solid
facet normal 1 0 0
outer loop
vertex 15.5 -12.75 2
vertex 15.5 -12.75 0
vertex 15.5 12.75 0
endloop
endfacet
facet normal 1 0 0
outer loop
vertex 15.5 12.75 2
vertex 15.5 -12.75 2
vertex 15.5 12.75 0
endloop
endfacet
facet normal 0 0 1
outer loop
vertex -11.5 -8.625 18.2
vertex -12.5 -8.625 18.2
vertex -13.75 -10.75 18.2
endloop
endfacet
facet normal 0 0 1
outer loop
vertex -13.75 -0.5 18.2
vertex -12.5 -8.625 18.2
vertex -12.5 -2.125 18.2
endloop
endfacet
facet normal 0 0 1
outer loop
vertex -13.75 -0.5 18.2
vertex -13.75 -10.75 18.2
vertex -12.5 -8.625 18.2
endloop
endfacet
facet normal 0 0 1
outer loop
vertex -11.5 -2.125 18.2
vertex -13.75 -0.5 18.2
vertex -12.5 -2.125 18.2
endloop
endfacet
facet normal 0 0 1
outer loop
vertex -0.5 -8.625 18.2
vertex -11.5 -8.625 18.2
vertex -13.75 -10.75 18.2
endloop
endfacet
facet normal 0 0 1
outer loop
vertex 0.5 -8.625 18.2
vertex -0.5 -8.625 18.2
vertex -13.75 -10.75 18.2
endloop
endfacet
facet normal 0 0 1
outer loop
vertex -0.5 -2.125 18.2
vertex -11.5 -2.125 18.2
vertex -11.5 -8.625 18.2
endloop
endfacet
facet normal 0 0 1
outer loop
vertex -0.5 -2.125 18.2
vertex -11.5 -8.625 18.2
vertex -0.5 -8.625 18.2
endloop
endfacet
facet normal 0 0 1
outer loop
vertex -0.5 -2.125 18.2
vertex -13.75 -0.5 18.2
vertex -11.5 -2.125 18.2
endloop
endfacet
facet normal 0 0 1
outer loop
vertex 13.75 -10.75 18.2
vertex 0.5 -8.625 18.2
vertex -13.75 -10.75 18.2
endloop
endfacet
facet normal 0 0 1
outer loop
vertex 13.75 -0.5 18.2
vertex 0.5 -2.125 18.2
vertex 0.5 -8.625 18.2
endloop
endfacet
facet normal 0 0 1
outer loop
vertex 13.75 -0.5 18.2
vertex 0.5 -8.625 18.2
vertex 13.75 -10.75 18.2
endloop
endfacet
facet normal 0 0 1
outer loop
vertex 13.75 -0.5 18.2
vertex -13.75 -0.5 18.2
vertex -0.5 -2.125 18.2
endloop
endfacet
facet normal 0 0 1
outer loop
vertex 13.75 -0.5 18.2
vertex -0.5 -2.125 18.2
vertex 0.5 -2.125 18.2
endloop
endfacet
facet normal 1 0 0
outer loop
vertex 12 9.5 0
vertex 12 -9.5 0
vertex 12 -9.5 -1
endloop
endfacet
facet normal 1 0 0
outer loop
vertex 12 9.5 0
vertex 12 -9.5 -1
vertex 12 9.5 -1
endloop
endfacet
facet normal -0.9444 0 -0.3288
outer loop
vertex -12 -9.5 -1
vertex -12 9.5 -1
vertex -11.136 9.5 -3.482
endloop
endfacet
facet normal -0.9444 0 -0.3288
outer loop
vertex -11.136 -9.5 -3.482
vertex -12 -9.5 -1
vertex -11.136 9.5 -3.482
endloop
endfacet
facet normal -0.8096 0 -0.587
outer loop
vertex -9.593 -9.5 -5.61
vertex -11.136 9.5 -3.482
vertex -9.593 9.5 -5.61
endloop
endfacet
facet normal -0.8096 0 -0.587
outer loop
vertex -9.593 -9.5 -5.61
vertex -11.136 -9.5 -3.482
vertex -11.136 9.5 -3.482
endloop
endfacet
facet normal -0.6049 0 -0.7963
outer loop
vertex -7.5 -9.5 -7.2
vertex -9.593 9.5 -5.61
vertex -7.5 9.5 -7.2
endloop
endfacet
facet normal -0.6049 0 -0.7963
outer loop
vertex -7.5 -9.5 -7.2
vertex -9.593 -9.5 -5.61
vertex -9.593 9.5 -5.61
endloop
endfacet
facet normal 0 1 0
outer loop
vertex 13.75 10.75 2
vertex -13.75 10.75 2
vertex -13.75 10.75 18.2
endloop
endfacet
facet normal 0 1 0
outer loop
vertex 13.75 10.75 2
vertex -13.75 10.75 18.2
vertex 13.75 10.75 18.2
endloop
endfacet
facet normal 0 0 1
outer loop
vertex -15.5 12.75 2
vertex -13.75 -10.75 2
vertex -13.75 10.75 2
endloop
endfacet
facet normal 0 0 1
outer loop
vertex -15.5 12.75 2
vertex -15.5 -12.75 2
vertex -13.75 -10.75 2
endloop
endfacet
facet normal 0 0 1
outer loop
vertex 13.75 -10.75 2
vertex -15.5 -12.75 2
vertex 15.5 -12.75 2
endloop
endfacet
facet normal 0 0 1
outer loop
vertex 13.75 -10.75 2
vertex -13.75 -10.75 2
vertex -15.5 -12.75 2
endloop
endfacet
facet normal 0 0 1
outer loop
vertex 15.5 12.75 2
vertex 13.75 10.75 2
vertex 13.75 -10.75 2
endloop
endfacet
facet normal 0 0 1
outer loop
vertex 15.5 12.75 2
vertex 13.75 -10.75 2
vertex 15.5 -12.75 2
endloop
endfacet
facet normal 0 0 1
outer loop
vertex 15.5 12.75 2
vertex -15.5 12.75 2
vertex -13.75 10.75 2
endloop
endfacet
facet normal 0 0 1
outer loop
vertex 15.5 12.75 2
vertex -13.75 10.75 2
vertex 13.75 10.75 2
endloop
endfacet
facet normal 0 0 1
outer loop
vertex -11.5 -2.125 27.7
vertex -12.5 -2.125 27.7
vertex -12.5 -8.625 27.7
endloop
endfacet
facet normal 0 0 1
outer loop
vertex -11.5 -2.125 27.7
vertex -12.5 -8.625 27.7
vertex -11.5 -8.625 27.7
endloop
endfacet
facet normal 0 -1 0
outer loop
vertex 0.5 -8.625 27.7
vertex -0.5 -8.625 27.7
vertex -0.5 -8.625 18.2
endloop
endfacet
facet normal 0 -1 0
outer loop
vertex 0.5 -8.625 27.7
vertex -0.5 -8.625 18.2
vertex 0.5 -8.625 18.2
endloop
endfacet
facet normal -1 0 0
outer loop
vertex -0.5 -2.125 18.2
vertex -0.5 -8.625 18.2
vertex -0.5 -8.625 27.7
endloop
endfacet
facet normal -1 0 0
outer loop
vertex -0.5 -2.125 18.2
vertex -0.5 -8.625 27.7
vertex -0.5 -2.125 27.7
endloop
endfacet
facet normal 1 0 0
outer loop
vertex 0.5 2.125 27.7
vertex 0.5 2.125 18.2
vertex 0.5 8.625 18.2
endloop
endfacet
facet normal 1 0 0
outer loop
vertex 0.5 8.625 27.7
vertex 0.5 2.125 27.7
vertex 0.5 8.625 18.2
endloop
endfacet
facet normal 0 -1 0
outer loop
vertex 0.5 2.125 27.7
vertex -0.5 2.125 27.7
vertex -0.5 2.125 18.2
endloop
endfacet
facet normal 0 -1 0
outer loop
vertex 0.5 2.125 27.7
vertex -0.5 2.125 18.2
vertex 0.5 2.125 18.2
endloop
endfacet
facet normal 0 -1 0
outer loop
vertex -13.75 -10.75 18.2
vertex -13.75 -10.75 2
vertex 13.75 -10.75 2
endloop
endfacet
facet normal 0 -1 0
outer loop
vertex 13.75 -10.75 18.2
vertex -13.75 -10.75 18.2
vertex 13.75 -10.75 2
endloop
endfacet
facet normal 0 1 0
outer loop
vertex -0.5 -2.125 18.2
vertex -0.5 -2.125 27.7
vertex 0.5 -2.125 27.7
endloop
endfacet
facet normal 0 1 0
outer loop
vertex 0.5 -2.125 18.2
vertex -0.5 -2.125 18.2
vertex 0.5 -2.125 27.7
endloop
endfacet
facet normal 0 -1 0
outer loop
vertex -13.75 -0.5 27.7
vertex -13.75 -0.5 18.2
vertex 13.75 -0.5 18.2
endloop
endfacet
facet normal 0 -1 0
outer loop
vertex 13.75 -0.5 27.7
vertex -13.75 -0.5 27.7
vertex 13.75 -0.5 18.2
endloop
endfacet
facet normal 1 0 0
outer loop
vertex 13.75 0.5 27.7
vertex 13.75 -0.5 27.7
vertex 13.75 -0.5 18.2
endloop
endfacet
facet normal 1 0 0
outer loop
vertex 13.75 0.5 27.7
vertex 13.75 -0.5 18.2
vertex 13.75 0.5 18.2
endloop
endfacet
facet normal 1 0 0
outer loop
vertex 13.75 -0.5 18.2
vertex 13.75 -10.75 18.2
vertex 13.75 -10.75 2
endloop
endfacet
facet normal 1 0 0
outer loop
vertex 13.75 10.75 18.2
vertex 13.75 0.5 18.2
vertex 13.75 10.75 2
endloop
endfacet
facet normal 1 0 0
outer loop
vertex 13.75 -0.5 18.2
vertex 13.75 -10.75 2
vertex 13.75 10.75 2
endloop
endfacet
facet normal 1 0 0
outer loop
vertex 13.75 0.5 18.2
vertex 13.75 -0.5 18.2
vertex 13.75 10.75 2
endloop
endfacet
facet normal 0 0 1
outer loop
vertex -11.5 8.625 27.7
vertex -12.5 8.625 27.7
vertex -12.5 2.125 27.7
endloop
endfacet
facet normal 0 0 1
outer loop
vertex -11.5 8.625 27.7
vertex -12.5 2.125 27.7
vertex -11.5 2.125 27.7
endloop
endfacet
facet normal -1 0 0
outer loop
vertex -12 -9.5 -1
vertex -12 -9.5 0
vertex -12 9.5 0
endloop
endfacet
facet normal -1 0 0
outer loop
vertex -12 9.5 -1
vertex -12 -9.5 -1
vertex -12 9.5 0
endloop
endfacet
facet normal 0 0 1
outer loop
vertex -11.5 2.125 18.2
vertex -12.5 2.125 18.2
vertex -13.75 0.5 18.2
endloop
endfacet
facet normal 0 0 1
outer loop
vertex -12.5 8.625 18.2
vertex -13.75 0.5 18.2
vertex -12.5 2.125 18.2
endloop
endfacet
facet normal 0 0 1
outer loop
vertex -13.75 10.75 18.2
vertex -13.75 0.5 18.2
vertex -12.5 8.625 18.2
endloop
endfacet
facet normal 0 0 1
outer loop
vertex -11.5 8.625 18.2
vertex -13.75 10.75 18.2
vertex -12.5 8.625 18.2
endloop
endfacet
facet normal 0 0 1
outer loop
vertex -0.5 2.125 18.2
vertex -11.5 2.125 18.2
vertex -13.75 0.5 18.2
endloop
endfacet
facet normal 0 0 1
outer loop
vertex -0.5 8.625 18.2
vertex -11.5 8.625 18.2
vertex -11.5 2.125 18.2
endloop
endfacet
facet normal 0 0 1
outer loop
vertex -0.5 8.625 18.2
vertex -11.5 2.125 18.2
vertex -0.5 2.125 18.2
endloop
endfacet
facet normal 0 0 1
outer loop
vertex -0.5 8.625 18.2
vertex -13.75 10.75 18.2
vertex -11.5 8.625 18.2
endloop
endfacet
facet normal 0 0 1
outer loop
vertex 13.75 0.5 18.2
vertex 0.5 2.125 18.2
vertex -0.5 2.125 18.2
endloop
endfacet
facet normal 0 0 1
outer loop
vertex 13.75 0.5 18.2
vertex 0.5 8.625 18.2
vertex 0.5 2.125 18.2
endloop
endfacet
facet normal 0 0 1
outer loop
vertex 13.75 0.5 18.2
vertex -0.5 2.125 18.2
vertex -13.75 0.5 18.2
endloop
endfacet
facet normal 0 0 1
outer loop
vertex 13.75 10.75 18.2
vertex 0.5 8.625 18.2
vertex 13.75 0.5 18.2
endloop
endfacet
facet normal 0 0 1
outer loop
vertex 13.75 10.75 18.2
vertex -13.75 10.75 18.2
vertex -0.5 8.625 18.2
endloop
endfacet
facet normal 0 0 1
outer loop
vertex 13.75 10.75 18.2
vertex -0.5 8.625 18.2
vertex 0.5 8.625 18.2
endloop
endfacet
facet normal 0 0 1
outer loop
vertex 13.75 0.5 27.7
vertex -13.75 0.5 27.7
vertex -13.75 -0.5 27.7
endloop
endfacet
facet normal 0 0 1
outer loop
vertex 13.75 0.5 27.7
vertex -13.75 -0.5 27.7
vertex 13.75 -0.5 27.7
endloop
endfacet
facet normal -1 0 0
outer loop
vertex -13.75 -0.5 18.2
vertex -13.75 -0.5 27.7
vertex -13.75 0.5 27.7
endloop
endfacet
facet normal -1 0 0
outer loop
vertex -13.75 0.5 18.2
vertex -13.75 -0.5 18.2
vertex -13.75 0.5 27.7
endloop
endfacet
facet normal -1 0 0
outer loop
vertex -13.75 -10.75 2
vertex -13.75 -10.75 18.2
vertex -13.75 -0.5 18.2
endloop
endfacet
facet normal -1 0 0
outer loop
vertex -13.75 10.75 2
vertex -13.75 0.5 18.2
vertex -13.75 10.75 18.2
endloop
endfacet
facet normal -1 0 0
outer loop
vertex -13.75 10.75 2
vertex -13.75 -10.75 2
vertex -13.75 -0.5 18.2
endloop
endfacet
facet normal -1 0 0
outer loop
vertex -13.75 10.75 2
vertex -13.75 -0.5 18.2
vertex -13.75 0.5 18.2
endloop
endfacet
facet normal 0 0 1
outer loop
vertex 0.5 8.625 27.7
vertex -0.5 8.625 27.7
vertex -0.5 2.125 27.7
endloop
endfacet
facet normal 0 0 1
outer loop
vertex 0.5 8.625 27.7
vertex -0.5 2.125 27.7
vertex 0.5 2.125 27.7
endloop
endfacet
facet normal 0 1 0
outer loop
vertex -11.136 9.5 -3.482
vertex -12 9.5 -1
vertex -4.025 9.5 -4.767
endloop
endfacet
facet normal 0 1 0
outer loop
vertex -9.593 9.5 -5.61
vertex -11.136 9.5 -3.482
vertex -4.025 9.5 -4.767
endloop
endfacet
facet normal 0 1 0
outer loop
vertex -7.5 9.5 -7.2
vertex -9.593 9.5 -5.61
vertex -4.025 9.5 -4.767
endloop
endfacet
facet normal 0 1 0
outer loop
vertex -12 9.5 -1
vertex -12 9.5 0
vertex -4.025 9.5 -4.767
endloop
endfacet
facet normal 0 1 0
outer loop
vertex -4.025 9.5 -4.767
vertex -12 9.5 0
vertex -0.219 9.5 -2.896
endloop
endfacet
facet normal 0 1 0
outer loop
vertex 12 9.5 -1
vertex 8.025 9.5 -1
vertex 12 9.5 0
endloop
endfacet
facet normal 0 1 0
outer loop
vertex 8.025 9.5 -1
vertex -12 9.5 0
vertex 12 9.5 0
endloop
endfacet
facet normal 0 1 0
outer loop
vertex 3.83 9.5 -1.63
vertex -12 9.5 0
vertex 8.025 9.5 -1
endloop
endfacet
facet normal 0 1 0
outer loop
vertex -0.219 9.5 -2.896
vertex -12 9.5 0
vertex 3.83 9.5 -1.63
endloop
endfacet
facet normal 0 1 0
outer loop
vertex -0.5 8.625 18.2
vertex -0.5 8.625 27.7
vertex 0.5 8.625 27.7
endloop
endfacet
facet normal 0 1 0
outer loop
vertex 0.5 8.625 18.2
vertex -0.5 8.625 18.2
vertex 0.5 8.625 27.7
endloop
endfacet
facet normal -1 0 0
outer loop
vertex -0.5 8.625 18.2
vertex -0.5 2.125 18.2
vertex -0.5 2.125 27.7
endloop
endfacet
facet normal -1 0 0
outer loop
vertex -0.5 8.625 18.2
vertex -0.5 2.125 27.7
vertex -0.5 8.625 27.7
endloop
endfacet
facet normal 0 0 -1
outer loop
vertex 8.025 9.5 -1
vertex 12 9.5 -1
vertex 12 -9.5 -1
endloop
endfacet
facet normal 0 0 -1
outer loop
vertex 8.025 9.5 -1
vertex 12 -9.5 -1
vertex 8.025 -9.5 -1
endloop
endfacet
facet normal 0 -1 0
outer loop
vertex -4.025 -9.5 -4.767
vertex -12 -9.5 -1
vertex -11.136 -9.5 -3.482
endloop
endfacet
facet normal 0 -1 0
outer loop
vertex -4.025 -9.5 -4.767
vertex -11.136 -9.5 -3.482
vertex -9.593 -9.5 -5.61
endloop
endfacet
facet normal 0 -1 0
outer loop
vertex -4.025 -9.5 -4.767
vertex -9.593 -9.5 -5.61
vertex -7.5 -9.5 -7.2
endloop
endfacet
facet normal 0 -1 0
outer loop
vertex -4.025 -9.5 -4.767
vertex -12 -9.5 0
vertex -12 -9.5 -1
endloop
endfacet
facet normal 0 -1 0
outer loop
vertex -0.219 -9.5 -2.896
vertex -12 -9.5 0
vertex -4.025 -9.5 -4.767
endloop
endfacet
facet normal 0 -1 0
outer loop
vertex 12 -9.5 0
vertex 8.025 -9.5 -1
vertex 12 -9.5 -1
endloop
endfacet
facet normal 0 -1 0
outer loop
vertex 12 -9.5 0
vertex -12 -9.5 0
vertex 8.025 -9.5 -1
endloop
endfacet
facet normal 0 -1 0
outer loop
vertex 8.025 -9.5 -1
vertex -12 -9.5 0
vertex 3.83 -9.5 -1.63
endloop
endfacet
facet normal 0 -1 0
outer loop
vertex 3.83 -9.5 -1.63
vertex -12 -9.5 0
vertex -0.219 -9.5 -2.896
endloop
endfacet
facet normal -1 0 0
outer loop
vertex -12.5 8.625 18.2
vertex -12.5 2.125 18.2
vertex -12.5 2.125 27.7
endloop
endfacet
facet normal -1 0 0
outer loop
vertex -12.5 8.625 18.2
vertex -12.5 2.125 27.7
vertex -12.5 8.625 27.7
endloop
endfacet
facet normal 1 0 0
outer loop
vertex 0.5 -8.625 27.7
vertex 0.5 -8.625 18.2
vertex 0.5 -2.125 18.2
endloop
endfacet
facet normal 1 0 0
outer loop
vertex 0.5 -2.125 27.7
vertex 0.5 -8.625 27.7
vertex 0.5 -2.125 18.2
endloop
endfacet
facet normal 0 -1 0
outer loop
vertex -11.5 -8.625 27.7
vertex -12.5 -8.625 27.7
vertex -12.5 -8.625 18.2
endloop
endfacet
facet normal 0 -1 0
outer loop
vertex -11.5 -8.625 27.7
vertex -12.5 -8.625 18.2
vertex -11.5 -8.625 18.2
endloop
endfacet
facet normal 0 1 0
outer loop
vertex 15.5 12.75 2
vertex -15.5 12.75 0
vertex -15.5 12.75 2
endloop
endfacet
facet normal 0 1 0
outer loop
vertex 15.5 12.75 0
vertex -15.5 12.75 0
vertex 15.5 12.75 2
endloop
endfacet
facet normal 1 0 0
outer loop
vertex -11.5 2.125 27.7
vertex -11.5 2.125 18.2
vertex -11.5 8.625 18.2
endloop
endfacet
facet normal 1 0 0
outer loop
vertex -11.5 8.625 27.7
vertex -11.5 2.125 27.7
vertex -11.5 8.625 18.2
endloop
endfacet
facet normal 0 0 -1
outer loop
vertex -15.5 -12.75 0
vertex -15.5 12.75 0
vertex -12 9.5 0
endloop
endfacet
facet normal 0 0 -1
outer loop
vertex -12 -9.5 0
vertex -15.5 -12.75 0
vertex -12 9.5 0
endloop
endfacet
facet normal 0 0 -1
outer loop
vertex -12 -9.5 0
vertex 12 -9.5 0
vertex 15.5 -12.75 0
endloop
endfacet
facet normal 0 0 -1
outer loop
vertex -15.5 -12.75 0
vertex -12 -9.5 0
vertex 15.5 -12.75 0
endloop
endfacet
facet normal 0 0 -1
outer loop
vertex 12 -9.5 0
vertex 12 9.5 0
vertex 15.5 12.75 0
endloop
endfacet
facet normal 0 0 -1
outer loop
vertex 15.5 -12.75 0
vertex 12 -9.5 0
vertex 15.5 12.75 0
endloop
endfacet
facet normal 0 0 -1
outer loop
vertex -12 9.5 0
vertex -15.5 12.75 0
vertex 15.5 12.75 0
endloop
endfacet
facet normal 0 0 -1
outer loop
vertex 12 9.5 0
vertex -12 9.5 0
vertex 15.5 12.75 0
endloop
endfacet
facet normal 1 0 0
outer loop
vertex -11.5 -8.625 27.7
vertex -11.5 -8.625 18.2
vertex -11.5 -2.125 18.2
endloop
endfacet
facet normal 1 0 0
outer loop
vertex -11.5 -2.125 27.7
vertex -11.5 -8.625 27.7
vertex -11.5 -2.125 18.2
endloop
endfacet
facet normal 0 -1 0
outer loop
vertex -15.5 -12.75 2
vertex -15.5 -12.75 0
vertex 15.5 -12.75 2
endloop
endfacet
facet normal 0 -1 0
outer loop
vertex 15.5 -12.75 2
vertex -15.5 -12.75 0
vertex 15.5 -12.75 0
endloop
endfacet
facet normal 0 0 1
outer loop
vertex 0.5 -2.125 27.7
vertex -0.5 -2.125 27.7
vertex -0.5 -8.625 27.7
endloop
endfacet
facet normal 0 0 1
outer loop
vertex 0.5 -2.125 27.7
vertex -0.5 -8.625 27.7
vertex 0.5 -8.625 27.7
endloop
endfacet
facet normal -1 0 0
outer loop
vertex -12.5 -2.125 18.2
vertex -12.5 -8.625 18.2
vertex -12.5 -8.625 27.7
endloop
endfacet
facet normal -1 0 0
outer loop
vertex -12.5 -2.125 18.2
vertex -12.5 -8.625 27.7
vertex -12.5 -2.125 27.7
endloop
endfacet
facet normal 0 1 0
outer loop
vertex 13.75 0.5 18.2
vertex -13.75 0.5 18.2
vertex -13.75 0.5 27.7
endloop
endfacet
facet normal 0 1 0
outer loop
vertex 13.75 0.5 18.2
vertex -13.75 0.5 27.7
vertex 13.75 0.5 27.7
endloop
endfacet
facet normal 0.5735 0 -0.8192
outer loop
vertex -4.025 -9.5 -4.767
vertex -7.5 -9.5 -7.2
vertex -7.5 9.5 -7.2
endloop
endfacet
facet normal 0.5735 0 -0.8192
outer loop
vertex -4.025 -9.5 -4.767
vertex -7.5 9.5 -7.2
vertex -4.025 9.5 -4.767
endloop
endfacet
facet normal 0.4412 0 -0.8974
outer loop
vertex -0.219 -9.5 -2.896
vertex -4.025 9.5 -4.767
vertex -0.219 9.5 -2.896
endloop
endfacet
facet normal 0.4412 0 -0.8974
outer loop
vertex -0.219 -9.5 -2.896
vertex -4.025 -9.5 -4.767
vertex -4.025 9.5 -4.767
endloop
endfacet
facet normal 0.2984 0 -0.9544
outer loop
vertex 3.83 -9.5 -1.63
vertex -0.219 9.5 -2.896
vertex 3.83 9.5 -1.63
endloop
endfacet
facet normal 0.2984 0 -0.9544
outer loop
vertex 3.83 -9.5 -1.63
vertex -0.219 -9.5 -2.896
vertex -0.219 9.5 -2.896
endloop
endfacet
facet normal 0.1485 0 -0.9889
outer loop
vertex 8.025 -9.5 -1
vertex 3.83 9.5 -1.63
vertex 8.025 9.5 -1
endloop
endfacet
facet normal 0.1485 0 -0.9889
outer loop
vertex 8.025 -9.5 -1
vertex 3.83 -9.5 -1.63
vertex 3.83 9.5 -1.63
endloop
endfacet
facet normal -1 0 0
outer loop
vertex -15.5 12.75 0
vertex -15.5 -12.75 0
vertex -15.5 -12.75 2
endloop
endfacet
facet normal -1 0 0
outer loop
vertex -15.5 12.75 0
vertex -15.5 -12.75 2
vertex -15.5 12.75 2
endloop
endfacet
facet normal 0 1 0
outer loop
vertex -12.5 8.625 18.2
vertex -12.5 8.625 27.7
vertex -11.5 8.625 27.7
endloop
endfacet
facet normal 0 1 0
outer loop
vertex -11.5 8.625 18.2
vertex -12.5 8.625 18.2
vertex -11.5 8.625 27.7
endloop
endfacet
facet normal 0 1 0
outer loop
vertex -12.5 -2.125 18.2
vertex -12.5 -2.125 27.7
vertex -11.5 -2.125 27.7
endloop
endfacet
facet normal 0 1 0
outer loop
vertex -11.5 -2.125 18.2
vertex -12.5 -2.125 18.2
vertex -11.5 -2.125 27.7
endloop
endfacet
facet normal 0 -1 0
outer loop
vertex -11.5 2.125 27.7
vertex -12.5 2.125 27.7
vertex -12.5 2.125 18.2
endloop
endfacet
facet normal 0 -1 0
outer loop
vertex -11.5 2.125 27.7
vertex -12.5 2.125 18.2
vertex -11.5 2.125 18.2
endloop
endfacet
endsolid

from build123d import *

# Parameters (mm, degrees)
ESBO_O1_W                = 31
ESBO_O1_H                = 25.5
RESSALTO_EXTRUS_O1_DEPTH = 2
ESBO_O2_W                = 27.5
ESBO_O2_H                = 21.5
RESSALTO_EXTRUS_O2_DEPTH = 16.2
ESBO_O3_W                = 1
ESBO_O3_H                = 6.5
ESBO_O3_W_2              = 27.5
ESBO_O3_H_2              = 1
RESSALTO_EXTRUS_O3_DEPTH = 9.5
ESBO_O4_W                = 24
ESBO_O4_H                = 19
RESSALTO_EXTRUS_O4_DEPTH = 1
RESSALTO_EXTRUS_O5_DEPTH = 19


with BuildPart() as part:
    # Esboço1 → Ressalto-extrusão1 (new body)
    with BuildSketch(Plane.XY):
        Rectangle(ESBO_O1_W, ESBO_O1_H)
    extrude(amount=RESSALTO_EXTRUS_O1_DEPTH)

    # Esboço2 → Ressalto-extrusão2 (add)
    with BuildSketch(Plane.XY.offset(2)):
        Rectangle(ESBO_O2_W, ESBO_O2_H)
    extrude(amount=RESSALTO_EXTRUS_O2_DEPTH)

    # Esboço3 → Ressalto-extrusão3 (add)
    with BuildSketch(Plane.XY.offset(18.2)):
        with Locations((-12, 5.375)):
            Rectangle(ESBO_O3_W, ESBO_O3_H)
        with Locations((0, -5.375)):
            Rectangle(ESBO_O3_W, ESBO_O3_H)
        with Locations((0, 5.375)):
            Rectangle(ESBO_O3_W, ESBO_O3_H)
        with Locations((-12, -5.375)):
            Rectangle(ESBO_O3_W, ESBO_O3_H)
        Rectangle(ESBO_O3_W_2, ESBO_O3_H_2)
    extrude(amount=RESSALTO_EXTRUS_O3_DEPTH)

    # Esboço4 → Ressalto-extrusão4 (add)
    with BuildSketch(Plane(origin=(0, 0, 0), x_dir=(-1, 0, 0), z_dir=(0, 0, -1))):
        Rectangle(ESBO_O4_W, ESBO_O4_H)
    extrude(amount=RESSALTO_EXTRUS_O4_DEPTH)

    # Esboço5 → Ressalto-extrusão5 (add)
    with BuildSketch(Plane.XZ.offset(9.5)):
        with BuildLine():
            Line((8.024552065, -1), (-12, -1))
            ThreePointArc((-12, -1), (-10.442623617, -4.60271069), (-7.5, -7.2))
            ThreePointArc((-7.5, -7.2), (-0.218681889, -2.895700597), (8.024552065, -1))
        make_face()
    extrude(amount=-RESSALTO_EXTRUS_O5_DEPTH)


solid = part.part
